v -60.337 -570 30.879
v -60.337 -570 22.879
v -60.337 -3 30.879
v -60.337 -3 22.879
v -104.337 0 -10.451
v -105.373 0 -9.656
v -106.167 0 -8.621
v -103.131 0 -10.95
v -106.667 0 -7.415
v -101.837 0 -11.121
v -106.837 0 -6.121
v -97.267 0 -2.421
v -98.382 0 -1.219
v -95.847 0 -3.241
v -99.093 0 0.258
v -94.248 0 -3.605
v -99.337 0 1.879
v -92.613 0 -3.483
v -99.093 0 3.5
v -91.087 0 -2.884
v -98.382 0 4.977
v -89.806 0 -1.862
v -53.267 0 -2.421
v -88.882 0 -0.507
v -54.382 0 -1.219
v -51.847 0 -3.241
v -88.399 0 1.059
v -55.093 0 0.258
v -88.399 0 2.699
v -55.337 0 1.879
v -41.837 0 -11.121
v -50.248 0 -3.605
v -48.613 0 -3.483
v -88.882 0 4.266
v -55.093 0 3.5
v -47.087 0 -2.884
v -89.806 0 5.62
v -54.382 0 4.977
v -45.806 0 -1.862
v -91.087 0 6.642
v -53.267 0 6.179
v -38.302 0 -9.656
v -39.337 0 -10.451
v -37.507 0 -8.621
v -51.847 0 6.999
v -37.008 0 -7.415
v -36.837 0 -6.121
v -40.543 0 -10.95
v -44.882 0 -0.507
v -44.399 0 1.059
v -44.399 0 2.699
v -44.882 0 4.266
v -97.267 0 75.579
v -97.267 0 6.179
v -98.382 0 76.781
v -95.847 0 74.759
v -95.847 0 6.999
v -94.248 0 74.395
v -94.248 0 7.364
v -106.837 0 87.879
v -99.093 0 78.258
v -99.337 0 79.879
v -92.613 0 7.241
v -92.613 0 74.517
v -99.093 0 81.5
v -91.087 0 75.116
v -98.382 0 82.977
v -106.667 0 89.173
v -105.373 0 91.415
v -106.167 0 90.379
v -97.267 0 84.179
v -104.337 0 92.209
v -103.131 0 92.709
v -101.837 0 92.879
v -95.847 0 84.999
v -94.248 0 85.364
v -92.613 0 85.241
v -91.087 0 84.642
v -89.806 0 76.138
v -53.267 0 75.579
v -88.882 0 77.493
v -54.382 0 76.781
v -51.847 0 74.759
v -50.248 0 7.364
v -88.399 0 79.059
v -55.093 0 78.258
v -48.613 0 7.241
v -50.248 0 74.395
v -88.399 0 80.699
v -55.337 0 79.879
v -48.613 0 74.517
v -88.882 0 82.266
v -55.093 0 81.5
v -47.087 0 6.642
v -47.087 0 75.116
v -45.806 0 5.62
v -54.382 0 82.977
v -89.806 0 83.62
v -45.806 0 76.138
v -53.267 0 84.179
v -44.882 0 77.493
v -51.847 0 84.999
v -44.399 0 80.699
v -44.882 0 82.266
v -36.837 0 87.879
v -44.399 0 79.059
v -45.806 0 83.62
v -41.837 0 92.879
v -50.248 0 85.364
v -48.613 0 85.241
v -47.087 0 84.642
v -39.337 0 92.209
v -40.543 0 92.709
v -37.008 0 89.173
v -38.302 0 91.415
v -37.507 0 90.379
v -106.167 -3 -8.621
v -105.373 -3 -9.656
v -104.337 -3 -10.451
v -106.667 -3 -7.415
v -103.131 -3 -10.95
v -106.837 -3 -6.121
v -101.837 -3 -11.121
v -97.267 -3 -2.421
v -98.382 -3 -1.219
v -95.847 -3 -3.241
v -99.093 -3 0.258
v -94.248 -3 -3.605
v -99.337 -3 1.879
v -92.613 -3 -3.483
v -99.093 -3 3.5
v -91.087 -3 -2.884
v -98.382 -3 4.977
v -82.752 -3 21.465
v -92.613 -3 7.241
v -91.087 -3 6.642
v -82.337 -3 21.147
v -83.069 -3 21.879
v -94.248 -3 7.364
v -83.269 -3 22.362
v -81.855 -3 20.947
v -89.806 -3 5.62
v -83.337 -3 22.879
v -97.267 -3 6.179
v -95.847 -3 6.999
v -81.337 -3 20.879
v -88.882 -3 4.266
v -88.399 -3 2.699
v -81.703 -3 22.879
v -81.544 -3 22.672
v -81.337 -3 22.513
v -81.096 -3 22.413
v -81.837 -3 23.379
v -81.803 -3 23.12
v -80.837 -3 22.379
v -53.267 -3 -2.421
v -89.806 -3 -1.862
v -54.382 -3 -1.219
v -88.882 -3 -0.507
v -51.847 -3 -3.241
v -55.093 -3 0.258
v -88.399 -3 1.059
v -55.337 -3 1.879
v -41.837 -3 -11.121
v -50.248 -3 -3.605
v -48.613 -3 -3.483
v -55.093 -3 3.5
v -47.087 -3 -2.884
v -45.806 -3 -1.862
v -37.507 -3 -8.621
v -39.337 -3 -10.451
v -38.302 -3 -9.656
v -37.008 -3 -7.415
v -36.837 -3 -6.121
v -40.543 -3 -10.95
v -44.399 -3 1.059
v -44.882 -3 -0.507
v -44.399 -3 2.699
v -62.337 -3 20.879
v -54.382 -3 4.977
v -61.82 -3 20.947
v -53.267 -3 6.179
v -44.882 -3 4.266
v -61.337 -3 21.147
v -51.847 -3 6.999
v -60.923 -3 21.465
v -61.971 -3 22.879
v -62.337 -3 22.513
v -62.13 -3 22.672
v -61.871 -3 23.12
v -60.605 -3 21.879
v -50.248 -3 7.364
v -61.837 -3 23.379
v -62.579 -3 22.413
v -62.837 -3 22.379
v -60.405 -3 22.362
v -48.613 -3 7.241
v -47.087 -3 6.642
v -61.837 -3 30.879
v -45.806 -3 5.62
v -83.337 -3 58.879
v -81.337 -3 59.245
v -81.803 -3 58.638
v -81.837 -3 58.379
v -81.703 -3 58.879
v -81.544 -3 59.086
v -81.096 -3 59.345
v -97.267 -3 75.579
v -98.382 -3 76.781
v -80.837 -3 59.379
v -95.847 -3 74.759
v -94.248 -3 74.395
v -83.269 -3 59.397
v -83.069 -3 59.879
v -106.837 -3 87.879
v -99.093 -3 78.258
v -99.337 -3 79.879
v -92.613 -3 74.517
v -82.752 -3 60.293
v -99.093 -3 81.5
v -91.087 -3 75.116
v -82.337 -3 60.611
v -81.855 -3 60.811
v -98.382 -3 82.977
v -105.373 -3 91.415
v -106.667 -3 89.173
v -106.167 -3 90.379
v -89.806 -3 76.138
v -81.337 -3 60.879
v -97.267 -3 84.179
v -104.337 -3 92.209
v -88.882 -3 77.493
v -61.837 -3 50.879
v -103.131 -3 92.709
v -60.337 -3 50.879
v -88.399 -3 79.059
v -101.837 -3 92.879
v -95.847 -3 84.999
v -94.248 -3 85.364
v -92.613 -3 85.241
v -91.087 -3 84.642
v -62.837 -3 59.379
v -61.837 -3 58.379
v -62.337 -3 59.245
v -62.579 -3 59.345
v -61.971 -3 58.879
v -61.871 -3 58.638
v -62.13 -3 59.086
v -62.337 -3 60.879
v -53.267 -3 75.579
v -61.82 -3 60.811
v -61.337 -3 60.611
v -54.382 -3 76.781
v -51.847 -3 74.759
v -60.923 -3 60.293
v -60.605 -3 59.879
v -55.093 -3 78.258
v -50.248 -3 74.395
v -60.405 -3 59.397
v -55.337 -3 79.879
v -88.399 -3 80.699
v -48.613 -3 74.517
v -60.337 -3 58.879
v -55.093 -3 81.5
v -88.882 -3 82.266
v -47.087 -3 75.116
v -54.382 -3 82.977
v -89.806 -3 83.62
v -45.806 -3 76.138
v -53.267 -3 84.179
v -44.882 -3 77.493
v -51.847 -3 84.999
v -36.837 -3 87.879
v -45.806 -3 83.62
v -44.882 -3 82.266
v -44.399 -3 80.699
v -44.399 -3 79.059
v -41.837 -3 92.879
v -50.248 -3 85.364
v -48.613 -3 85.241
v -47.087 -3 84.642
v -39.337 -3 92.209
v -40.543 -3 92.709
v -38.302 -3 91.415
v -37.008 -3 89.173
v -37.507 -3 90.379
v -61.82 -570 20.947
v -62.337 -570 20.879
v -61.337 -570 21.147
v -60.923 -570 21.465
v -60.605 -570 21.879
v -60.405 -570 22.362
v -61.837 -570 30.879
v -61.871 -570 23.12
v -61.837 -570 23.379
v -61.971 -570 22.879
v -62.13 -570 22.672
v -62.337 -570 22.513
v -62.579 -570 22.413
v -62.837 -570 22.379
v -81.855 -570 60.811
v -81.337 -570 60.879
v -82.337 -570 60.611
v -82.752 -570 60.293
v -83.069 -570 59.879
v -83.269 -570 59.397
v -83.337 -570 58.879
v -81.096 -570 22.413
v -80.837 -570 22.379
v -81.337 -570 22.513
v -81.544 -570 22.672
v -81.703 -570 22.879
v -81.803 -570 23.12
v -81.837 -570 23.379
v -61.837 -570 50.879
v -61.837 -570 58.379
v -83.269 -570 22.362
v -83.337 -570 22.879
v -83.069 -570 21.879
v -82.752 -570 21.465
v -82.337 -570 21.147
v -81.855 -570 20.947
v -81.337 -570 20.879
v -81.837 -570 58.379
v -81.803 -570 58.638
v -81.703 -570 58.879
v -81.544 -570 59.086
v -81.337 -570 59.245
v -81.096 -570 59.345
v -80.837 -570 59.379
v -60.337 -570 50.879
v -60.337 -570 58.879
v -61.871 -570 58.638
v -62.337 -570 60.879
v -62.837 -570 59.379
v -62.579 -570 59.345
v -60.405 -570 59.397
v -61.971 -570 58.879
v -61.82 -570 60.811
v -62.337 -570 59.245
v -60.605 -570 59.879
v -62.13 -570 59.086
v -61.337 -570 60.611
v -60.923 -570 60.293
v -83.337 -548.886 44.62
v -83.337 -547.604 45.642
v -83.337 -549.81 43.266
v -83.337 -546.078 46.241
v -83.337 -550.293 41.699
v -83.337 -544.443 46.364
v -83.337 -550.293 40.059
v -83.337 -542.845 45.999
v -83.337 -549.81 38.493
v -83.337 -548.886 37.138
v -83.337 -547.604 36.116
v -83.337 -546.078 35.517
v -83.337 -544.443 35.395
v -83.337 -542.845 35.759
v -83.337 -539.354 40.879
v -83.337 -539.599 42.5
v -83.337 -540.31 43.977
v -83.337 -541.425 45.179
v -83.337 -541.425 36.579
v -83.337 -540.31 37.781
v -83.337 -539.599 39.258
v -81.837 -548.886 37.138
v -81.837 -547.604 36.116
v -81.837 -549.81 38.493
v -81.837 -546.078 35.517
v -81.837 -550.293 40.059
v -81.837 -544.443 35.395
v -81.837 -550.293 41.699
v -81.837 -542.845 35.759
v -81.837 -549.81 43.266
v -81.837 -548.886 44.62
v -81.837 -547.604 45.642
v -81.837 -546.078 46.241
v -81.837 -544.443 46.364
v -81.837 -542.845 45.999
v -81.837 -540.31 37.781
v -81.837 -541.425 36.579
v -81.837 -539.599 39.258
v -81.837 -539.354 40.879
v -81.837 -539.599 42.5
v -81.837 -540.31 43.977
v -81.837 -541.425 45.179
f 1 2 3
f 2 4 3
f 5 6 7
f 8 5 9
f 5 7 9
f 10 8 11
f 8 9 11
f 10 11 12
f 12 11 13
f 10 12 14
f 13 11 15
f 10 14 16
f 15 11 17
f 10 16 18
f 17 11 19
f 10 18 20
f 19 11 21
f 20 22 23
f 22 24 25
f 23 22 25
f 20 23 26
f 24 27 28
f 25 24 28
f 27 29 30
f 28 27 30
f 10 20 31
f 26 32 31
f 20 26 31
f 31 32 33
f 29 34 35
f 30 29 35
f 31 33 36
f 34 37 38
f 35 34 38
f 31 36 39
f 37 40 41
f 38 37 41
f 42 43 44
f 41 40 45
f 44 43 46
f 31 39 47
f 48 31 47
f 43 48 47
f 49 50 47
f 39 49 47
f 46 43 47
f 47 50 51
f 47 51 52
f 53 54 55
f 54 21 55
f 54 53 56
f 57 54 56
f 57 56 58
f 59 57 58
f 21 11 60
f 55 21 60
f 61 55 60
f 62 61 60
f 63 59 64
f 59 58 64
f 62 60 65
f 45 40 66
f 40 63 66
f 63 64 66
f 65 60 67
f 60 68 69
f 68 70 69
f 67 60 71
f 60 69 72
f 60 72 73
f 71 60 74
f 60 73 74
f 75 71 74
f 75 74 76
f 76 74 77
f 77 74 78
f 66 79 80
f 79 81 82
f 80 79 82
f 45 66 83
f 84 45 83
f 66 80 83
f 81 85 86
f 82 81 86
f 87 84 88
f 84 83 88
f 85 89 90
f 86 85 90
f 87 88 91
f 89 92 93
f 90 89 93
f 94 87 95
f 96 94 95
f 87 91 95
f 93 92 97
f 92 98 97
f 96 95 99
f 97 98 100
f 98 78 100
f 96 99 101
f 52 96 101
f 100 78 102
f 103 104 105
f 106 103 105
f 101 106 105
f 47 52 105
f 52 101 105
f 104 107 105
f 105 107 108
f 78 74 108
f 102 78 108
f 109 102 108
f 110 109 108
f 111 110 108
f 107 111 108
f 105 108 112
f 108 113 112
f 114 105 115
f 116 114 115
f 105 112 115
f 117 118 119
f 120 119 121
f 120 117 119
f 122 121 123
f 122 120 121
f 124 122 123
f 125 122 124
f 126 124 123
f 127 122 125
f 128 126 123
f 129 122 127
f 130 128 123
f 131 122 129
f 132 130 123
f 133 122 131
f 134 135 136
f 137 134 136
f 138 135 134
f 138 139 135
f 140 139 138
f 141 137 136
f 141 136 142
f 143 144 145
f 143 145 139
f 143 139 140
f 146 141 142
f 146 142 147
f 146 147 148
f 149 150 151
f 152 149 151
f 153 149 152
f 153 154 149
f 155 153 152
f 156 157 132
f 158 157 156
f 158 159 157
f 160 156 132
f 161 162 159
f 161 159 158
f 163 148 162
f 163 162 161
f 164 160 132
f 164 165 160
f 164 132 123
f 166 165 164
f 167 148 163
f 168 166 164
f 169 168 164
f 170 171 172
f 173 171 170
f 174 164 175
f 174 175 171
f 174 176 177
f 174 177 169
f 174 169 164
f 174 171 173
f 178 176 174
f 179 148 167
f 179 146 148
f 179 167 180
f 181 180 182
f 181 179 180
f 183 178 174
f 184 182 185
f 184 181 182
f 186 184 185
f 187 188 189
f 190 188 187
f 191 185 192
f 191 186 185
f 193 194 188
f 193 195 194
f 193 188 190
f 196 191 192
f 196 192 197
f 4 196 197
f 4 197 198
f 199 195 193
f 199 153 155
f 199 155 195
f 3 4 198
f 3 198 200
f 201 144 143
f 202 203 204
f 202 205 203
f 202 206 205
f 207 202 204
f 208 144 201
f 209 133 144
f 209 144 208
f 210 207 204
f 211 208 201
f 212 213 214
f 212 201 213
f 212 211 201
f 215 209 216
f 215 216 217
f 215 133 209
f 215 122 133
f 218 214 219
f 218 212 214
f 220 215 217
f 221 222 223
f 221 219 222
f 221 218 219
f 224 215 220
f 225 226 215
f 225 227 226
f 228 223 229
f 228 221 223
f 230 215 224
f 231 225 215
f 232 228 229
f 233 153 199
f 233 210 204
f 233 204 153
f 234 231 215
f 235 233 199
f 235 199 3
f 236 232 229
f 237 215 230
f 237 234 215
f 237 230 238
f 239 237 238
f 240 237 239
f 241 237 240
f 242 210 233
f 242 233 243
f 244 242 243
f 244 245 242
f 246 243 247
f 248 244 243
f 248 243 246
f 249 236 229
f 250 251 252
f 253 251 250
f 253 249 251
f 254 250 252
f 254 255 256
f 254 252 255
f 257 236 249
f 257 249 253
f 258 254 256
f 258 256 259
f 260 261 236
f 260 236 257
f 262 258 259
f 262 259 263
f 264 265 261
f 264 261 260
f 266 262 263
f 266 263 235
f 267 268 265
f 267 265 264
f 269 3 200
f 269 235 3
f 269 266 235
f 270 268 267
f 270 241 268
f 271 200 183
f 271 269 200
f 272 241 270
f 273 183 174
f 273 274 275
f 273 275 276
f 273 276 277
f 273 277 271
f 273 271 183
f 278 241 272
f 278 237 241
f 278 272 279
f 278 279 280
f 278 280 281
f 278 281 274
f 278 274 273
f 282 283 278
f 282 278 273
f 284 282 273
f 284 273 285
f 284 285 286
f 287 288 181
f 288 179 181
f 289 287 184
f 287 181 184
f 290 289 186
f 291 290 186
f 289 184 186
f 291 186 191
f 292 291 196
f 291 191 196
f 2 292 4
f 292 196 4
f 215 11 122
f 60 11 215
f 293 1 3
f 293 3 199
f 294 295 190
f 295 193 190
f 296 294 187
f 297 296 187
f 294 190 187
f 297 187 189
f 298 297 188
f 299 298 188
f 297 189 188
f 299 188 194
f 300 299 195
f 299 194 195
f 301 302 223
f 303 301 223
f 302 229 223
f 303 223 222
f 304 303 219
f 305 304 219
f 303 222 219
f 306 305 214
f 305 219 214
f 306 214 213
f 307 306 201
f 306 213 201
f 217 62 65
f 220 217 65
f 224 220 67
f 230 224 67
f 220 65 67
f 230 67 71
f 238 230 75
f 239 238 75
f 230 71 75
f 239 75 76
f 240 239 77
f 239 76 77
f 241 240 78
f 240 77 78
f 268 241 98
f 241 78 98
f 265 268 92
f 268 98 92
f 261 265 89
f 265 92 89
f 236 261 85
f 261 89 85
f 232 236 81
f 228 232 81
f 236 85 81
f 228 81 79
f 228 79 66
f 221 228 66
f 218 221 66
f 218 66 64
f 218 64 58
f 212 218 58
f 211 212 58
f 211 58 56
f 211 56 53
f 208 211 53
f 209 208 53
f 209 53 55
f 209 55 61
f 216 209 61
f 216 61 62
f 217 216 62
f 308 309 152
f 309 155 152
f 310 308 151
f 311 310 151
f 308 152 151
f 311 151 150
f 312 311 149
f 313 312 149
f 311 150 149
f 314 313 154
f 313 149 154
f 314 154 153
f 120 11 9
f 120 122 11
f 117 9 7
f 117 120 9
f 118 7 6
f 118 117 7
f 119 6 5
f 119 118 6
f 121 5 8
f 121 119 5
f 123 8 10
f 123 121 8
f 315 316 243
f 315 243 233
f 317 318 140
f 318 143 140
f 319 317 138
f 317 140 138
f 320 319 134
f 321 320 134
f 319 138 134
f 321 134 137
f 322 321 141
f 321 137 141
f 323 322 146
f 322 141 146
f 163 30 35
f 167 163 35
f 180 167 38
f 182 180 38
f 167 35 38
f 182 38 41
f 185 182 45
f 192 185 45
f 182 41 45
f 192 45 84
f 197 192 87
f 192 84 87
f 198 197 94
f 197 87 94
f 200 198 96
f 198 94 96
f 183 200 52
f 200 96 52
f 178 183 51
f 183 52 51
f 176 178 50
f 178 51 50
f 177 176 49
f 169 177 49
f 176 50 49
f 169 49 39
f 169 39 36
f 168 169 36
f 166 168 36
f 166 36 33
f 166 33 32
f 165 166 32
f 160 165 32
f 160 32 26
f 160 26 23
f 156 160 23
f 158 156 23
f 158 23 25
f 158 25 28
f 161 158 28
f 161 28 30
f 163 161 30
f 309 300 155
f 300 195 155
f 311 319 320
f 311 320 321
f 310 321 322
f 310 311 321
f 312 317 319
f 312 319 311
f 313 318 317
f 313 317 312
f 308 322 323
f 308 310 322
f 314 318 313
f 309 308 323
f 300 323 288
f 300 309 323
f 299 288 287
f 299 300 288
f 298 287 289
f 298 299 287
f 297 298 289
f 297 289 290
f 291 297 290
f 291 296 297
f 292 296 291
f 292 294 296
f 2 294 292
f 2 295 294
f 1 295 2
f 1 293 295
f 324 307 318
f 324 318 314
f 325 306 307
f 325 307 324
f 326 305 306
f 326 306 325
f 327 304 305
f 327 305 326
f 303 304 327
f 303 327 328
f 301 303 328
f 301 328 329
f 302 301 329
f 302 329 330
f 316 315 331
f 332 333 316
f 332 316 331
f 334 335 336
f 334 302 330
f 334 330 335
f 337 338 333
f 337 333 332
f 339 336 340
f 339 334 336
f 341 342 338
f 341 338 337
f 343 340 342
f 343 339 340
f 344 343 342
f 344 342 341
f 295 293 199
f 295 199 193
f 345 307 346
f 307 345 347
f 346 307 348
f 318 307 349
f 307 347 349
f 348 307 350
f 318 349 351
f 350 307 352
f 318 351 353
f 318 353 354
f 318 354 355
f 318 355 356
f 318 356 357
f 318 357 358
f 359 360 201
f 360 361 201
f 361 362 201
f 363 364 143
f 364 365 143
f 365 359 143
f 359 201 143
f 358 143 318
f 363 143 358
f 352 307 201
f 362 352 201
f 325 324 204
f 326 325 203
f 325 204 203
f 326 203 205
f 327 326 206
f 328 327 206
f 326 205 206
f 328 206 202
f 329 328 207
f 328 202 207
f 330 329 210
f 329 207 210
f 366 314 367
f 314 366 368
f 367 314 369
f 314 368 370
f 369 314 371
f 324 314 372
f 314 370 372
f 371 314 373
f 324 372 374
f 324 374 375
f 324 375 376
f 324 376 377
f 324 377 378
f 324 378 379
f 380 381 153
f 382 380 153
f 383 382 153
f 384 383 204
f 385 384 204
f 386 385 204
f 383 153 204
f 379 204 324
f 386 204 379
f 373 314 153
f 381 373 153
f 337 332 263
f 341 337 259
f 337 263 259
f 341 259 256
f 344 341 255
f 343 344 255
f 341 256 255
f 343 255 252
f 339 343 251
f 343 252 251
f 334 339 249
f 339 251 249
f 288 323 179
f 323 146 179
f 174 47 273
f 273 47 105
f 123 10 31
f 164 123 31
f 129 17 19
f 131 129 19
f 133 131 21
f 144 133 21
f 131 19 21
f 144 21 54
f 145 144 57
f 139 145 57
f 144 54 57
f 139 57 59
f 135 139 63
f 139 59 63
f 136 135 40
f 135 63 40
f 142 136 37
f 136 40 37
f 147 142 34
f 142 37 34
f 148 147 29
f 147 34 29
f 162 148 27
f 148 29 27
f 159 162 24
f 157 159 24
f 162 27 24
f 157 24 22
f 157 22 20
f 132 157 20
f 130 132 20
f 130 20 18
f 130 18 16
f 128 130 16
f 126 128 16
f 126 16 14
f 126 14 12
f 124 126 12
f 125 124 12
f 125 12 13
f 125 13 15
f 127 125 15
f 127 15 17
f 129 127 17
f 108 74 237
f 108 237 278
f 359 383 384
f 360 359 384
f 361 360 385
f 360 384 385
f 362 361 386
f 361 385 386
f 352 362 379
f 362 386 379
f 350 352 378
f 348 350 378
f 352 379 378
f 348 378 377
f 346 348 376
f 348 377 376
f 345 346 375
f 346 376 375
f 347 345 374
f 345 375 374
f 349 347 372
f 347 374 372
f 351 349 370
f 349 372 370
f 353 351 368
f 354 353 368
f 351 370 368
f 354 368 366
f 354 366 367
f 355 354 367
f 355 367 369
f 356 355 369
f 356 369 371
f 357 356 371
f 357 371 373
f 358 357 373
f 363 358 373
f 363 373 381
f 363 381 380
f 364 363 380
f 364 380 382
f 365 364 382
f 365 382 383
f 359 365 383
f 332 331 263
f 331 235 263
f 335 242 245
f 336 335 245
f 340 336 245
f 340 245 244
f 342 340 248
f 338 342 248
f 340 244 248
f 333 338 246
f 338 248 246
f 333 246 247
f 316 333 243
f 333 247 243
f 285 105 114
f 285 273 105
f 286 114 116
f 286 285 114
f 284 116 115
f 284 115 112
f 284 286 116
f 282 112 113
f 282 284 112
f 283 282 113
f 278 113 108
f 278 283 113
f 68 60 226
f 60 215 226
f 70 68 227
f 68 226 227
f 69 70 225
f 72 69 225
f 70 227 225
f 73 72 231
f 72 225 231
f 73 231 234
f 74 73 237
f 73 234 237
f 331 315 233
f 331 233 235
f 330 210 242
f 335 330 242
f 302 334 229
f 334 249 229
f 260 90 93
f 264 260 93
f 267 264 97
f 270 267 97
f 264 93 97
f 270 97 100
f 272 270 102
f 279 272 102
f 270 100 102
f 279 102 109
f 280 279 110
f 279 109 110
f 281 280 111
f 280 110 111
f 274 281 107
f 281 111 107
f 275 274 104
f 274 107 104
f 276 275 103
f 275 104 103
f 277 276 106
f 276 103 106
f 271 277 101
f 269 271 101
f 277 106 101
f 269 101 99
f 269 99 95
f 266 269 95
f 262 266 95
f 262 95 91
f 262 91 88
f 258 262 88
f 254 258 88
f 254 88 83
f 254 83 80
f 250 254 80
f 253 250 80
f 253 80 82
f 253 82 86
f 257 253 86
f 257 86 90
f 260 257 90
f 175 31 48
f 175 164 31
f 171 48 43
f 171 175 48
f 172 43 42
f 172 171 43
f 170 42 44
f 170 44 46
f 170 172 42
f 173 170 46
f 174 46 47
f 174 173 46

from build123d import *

# Parameters (mm, degrees)
F0_W     = 70
F0_H     = 104
F1_DEPTH = 3
F2_R     = 5
F4_D     = 11
F6_DEPTH = 444
F9_DEPTH = 123
F10_D    = 11


with BuildPart() as f1:
    # F0 (on Front) → F1 (new body)
    with BuildSketch(Plane.XZ):
        with Locations((-71.837332, 40.87914)):
            Rectangle(F0_W, F0_H)
    extrude(amount=F1_DEPTH)

    # F2
    f2_edges = [f1.edges().sort_by_distance(p)[0] for p in [
        (-36.837332, -1.5, 92.87914),
        (-106.837332, -1.5, 92.87914),
        (-106.837332, -1.5, -11.12086),
        (-36.837332, -1.5, -11.12086),
    ]]
    fillet(f2_edges, radius=F2_R)

    # F4 (through all)
    with Locations(Plane.XZ.offset(3)):
        with Locations((-49.837332, 1.87914), (-93.837332, 1.87914), (-93.837332, 79.87914), (-49.837332, 79.87914)):
            Hole(F4_D / 2)

    # F5 (on face) → F6 (join)
    with BuildSketch(Plane.XZ.offset(3)):
        with BuildLine():
            ThreePointArc((-60.337332, 58.87914), (-60.923118, 60.293354), (-62.337332, 60.87914))
            Line((-62.337332, 60.87914), (-81.337332, 60.87914))
            ThreePointArc((-81.337332, 60.87914), (-82.751546, 60.293354), (-83.337332, 58.87914))
            Line((-83.337332, 58.87914), (-83.337332, 22.87914))
            ThreePointArc((-83.337332, 22.87914), (-82.751546, 21.464927), (-81.337332, 20.87914))
            Line((-81.337332, 20.87914), (-62.337332, 20.87914))
            ThreePointArc((-62.337332, 20.87914), (-60.923118, 21.464927), (-60.337332, 22.87914))
            Line((-60.337332, 22.87914), (-60.337332, 30.87914))
            Line((-60.337332, 30.87914), (-61.837332, 30.87914))
            Line((-61.837332, 30.87914), (-61.837332, 23.37914))
            ThreePointArc((-61.837332, 23.37914), (-62.130225, 22.672034), (-62.837332, 22.37914))
            Line((-62.837332, 22.37914), (-80.837332, 22.37914))
            ThreePointArc((-80.837332, 22.37914), (-81.544439, 22.672034), (-81.837332, 23.37914))
            Line((-81.837332, 23.37914), (-81.837332, 58.37914))
            ThreePointArc((-81.837332, 58.37914), (-81.544439, 59.086247), (-80.837332, 59.37914))
            Line((-80.837332, 59.37914), (-62.837332, 59.37914))
            ThreePointArc((-62.837332, 59.37914), (-62.130225, 59.086247), (-61.837332, 58.37914))
            Line((-61.837332, 58.37914), (-61.837332, 50.87914))
            Line((-61.837332, 50.87914), (-60.337332, 50.87914))
            Line((-60.337332, 50.87914), (-60.337332, 58.87914))
        make_face()
    extrude(amount=F6_DEPTH)

    # F7 (on face) → F9 (join)
    with BuildSketch(Plane.XZ.offset(447)):
        with BuildLine():
            ThreePointArc((-62.837332, 59.37914), (-62.130225, 59.086247), (-61.837332, 58.37914))
            Line((-61.837332, 58.37914), (-61.837332, 50.87914))
            Line((-61.837332, 50.87914), (-60.337332, 50.87914))
            Line((-60.337332, 50.87914), (-60.337332, 58.87914))
            ThreePointArc((-60.337332, 58.87914), (-60.923118, 60.293354), (-62.337332, 60.87914))
            Line((-62.337332, 60.87914), (-81.337332, 60.87914))
            ThreePointArc((-81.337332, 60.87914), (-82.751546, 60.293354), (-83.337332, 58.87914))
            Line((-83.337332, 58.87914), (-83.337332, 22.87914))
            ThreePointArc((-83.337332, 22.87914), (-82.751546, 21.464927), (-81.337332, 20.87914))
            Line((-81.337332, 20.87914), (-62.337332, 20.87914))
            ThreePointArc((-62.337332, 20.87914), (-60.923118, 21.464927), (-60.337332, 22.87914))
            Line((-60.337332, 22.87914), (-60.337332, 30.87914))
            Line((-60.337332, 30.87914), (-61.837332, 30.87914))
            Line((-61.837332, 30.87914), (-61.837332, 23.37914))
            ThreePointArc((-61.837332, 23.37914), (-62.130225, 22.672034), (-62.837332, 22.37914))
            Line((-62.837332, 22.37914), (-80.837332, 22.37914))
            ThreePointArc((-80.837332, 22.37914), (-81.544439, 22.672034), (-81.837332, 23.37914))
            Line((-81.837332, 23.37914), (-81.837332, 58.37914))
            ThreePointArc((-81.837332, 58.37914), (-81.544439, 59.086247), (-80.837332, 59.37914))
            Line((-80.837332, 59.37914), (-62.837332, 59.37914))
        make_face()
    extrude(amount=F9_DEPTH)

    # F10 (through all)
    with Locations(Plane(origin=(-83.337332, 0, 0), x_dir=(0, -1, 0), z_dir=(-1, 0, 0))):
        with Locations((544.8542, 40.87914)):
            Hole(F10_D / 2)


solid = f1.part
